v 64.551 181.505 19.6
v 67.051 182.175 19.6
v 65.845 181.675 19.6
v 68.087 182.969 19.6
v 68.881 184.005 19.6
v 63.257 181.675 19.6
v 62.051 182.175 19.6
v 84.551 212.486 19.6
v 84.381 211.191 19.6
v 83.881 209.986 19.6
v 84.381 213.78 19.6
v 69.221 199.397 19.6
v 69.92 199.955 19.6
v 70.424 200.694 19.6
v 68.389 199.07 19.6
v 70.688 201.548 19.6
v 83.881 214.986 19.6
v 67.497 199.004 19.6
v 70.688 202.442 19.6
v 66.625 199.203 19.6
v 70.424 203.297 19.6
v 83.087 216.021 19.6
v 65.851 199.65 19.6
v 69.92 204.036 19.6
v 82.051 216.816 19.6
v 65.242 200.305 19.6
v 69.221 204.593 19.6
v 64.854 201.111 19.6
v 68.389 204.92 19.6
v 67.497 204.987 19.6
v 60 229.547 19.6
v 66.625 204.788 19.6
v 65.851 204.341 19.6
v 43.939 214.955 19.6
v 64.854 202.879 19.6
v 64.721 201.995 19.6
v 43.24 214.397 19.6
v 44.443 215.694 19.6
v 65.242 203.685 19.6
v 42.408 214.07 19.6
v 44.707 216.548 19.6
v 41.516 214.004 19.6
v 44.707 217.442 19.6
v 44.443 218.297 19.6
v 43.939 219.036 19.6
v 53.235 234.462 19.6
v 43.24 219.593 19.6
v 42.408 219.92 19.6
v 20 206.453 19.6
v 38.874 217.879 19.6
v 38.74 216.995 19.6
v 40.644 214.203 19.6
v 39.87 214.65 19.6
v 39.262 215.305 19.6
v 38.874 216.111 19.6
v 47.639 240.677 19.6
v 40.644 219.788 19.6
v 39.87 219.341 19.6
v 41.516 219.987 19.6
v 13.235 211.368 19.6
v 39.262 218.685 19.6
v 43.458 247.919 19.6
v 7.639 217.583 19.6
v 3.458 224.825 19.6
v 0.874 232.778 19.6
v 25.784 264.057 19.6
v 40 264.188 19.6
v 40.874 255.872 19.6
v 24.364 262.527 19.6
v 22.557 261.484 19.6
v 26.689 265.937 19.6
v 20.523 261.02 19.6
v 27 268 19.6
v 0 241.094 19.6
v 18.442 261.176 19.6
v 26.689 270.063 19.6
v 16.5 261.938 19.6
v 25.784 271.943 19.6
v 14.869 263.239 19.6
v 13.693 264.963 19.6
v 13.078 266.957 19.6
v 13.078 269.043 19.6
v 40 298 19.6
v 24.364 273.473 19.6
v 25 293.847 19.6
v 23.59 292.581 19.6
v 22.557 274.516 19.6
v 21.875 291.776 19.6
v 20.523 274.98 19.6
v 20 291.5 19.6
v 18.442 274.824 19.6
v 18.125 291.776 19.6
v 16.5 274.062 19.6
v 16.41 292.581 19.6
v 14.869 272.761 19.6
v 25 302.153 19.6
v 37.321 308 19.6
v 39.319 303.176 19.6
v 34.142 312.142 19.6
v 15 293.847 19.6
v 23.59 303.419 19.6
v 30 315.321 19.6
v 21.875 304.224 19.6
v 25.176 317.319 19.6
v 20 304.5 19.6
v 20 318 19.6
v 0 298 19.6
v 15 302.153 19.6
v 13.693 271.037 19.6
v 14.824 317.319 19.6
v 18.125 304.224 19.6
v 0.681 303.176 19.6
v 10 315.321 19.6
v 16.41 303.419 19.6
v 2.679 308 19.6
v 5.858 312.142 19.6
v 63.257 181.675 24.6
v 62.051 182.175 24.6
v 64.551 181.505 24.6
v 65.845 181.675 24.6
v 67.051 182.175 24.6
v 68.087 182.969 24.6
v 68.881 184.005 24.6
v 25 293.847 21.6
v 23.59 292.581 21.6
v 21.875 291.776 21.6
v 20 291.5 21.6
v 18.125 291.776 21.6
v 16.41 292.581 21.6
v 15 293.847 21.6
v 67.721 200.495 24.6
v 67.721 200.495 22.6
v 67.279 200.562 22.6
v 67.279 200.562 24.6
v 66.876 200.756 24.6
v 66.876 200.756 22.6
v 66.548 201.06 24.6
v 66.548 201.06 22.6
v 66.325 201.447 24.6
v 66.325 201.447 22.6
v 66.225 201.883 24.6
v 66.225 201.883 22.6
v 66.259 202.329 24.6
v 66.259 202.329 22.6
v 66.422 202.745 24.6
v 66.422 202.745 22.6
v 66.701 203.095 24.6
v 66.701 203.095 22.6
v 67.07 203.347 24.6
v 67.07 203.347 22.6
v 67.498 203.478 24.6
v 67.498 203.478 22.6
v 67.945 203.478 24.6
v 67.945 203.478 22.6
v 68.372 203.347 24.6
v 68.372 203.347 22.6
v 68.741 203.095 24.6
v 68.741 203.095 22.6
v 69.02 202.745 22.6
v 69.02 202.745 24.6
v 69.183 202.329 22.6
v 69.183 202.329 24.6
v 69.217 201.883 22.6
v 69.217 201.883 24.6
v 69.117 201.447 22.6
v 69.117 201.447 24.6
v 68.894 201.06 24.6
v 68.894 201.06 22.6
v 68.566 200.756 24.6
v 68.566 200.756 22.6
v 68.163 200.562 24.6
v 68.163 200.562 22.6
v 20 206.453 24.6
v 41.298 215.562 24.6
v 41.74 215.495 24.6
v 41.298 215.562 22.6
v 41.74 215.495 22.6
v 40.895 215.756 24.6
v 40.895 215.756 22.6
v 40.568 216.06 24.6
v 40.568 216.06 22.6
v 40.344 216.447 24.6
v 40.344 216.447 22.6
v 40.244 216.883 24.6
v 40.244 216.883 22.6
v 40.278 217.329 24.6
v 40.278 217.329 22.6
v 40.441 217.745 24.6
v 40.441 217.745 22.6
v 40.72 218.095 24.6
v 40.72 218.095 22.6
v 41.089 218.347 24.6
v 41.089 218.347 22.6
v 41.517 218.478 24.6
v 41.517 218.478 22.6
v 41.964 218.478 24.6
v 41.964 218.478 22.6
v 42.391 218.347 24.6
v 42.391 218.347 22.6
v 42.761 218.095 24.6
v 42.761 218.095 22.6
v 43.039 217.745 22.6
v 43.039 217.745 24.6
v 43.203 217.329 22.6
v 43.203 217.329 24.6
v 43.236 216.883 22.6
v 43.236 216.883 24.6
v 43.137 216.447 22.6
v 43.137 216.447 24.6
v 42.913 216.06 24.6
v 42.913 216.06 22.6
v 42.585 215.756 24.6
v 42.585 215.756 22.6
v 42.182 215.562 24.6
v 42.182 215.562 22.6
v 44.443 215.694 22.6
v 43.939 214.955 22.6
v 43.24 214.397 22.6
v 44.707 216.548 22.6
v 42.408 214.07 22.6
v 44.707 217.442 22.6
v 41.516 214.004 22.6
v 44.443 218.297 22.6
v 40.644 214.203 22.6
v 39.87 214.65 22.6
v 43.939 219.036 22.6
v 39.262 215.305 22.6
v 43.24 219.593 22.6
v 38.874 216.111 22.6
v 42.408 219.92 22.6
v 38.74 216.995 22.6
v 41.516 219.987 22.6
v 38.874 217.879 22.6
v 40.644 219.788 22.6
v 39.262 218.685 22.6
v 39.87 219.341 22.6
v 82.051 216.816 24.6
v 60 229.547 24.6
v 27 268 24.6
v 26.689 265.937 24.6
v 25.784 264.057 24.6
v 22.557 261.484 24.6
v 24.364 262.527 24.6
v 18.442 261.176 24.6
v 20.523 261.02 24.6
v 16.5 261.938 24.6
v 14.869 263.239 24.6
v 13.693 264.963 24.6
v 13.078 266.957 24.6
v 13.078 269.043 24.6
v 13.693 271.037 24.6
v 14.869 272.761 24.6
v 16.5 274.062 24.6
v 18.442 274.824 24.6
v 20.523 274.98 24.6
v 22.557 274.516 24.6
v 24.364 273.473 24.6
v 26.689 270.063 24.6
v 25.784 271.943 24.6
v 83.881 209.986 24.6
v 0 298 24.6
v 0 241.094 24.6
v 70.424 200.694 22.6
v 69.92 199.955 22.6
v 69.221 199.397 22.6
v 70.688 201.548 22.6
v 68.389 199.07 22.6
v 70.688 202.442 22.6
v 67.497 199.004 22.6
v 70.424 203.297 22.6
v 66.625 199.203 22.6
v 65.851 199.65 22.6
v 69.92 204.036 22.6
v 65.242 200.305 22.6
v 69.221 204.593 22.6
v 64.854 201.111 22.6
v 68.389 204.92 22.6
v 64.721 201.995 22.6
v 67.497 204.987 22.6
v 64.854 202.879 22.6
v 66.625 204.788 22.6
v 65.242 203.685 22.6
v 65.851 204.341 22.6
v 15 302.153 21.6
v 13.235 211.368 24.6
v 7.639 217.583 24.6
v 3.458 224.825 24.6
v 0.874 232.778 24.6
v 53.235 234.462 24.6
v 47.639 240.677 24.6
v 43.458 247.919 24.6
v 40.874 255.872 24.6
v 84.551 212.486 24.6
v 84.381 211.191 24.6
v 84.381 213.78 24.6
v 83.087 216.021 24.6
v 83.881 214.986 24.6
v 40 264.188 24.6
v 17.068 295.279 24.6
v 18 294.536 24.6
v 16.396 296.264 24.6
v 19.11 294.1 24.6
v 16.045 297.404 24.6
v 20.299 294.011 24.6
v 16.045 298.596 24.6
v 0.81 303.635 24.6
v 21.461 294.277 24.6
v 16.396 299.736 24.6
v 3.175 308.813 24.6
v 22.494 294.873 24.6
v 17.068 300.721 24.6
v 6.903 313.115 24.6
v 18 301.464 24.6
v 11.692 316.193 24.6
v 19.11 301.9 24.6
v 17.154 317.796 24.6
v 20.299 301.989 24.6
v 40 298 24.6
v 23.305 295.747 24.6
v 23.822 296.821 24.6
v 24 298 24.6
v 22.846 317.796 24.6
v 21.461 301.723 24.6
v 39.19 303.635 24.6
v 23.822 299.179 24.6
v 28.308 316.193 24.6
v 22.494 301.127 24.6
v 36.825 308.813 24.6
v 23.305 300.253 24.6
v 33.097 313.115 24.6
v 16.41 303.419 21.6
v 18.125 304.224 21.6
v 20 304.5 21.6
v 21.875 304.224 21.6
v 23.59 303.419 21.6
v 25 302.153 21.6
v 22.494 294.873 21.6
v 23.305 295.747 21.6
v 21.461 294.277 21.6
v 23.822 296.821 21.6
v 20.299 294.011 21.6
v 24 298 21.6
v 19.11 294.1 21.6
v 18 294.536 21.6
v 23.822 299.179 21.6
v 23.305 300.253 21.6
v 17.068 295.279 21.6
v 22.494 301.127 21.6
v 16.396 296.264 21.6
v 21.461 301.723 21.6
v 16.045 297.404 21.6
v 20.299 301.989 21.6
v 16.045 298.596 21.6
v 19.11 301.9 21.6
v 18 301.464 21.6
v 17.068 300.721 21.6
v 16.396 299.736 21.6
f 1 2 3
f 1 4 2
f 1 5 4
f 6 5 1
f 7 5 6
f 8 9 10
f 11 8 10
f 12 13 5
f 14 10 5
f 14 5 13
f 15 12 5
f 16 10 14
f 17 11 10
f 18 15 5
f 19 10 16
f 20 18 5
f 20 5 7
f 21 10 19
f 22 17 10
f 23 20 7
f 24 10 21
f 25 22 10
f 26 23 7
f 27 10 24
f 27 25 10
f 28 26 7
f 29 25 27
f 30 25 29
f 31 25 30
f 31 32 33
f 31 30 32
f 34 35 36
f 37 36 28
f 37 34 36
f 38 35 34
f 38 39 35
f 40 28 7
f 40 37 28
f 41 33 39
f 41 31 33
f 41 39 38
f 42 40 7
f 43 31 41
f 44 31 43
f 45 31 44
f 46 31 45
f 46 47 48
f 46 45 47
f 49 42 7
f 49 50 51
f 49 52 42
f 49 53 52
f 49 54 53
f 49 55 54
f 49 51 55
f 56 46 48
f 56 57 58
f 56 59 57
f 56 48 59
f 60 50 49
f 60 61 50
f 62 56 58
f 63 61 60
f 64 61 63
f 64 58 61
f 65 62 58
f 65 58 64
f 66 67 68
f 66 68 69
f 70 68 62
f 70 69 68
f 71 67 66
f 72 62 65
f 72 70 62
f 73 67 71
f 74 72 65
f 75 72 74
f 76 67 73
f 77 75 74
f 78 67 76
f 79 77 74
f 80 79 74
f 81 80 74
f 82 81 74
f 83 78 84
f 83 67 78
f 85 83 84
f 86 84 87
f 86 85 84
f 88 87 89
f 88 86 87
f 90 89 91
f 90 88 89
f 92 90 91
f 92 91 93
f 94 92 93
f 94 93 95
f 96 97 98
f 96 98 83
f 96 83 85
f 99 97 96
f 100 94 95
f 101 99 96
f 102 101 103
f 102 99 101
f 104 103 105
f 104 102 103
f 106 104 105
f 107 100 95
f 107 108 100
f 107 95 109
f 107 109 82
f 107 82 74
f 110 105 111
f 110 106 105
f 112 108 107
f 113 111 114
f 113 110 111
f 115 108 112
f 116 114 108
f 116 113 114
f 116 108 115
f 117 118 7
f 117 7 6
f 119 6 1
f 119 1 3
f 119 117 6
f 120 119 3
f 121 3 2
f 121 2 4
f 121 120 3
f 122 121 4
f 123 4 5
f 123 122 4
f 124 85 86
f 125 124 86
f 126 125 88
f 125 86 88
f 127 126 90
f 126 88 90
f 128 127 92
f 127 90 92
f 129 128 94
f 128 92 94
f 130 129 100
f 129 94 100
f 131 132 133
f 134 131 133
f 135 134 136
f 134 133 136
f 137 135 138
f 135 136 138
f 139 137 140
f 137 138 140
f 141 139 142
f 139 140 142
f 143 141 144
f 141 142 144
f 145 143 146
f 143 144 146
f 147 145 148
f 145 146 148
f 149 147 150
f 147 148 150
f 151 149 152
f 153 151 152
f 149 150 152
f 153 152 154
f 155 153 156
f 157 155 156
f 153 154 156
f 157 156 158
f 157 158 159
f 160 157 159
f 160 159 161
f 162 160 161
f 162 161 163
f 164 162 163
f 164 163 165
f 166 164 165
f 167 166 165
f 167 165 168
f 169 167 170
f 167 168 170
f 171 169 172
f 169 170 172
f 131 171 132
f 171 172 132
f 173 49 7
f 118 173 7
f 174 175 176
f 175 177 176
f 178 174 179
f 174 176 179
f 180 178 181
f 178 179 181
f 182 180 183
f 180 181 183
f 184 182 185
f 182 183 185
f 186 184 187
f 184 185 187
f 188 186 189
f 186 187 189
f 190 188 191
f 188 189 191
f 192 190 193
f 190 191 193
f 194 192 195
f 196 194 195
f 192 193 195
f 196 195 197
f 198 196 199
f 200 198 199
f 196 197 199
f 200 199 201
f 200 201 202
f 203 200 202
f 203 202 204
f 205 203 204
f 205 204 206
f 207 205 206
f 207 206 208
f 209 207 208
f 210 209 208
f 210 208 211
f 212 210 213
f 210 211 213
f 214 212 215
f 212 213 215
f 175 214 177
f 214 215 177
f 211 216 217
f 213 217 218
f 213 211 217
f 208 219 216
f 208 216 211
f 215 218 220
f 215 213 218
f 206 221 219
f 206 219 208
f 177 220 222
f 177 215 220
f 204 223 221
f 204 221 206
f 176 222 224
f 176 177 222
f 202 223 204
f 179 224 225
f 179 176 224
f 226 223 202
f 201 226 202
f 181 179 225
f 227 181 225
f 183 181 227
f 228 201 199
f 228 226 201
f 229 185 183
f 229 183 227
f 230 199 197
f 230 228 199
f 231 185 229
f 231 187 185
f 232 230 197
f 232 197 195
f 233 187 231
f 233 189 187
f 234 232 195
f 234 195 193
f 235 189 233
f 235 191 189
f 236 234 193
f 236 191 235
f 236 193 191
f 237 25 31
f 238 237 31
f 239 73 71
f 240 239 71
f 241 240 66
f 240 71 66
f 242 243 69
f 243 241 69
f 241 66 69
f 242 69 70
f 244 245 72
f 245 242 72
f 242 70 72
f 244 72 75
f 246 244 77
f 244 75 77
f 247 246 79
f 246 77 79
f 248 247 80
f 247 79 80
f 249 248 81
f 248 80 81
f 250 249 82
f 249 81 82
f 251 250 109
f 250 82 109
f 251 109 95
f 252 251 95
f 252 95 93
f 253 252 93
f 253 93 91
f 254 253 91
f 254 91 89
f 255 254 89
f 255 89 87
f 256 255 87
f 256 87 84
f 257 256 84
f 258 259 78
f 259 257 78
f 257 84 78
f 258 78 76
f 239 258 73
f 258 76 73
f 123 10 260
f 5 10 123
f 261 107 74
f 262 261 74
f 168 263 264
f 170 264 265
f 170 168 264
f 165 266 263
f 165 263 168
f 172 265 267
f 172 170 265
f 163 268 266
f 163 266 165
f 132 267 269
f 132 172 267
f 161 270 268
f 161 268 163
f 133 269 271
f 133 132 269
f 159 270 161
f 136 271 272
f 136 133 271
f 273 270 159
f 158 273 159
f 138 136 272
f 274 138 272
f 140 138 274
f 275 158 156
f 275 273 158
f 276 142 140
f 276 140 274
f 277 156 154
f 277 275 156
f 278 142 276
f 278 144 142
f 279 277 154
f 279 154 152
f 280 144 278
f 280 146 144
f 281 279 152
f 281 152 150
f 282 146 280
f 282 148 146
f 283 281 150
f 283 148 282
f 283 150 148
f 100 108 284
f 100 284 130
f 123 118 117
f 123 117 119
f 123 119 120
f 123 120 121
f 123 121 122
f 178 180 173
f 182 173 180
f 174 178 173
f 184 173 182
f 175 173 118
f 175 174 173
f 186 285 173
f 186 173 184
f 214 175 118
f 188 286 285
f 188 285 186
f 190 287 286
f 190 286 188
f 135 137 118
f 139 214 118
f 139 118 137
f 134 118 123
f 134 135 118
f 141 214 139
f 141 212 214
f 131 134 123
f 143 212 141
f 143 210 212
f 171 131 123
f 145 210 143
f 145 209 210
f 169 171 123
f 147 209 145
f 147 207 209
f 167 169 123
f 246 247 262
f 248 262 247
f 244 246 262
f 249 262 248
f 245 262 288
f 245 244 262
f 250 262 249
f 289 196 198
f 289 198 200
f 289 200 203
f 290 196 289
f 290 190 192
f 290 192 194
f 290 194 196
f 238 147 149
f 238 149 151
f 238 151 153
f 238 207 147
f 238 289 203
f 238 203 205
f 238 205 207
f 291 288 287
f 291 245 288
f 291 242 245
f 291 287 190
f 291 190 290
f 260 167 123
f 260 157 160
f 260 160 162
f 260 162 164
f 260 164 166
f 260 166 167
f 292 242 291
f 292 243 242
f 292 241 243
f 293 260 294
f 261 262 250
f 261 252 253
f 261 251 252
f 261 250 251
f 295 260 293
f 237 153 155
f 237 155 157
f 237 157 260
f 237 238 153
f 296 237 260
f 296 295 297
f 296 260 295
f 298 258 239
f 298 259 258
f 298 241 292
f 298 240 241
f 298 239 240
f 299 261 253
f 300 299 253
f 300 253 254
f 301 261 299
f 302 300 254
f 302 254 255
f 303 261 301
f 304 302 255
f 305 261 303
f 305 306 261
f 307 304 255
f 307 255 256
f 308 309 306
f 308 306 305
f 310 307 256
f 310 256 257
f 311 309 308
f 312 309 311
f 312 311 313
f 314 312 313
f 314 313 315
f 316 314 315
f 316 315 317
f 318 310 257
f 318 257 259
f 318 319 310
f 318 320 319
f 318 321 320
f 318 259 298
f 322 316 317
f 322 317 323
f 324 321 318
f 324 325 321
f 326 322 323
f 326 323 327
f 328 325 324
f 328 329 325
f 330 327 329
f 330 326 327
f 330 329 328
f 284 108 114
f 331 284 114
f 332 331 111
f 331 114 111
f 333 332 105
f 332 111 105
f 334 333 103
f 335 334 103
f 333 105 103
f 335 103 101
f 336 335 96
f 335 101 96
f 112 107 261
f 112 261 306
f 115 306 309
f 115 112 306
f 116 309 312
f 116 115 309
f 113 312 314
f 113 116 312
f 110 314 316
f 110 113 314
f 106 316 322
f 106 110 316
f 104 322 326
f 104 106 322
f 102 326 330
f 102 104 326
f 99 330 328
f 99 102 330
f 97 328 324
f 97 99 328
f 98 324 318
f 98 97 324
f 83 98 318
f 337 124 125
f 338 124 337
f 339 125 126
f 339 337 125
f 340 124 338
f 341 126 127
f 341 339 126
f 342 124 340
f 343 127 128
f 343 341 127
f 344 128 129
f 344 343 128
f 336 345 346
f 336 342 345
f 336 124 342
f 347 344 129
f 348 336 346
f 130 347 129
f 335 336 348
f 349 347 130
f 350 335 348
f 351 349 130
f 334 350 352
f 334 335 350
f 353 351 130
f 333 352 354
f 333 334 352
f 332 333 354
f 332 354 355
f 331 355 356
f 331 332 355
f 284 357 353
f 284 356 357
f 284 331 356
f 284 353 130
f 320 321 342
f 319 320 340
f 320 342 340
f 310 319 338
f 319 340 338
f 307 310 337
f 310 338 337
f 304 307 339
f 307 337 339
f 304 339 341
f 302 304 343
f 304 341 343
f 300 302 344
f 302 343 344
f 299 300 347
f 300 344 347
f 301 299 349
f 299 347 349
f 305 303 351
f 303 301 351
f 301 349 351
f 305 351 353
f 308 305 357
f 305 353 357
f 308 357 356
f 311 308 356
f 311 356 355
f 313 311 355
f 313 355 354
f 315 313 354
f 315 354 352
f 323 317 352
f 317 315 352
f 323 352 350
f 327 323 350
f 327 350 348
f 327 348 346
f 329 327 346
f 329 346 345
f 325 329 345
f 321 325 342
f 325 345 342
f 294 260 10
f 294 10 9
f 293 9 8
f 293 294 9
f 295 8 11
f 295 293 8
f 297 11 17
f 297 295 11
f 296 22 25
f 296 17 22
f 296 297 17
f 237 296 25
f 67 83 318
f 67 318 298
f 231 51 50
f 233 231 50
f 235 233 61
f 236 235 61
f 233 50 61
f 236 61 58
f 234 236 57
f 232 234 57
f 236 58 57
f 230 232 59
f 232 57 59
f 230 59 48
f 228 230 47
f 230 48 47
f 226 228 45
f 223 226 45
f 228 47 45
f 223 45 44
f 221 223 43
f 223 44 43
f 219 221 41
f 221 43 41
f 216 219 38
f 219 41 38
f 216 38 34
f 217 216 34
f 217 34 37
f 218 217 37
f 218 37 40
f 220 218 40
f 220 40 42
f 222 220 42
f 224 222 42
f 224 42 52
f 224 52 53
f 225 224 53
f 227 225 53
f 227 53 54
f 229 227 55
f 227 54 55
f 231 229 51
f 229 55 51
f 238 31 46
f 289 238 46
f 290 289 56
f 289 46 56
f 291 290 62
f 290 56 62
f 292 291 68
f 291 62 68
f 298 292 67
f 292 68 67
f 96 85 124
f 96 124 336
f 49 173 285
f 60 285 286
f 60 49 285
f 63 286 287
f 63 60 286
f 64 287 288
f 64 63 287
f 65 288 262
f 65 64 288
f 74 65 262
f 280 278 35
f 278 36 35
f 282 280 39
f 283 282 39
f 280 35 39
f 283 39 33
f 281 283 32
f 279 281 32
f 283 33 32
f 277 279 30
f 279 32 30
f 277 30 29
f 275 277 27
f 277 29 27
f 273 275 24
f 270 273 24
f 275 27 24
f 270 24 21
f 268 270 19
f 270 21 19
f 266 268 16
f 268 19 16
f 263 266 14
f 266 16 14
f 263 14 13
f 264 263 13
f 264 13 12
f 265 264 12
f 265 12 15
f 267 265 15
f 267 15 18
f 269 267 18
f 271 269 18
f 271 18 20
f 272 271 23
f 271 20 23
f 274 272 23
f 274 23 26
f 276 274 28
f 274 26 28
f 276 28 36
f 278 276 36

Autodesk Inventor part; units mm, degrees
ref_plane "YZ Plane" through (0, 0, 0) normal (1, 0, 0) x (0, 1, 0)
ref_plane "XZ Plane" through (0, 0, 0) normal (0, 1, 0) x (-1, 0, 0)
ref_plane "XY Plane" through (0, 0, 0) normal (0, 0, 1) x (1, 0, 0)
sketch "スケッチ1" plane through (0, 0, 0) normal (0, 0, 1) x (1, 0, 0)
  line L0 (0, 0) -> (40, 0)
  line L1 (40, 0) -> (40, 318)
  line L2 (40, 318) -> (0, 318)
  line L3 (0, 318) -> (0, 0)
  line L4 (0, 218) -> (112.7627, 152.8964)
  line L5 (112.7627, 152.8964) -> (132.7627, 187.5375)
  line L6 (132.7627, 187.5375) -> (40, 241.094)
  point P0 (40, 218)
  point P1 (40, 194.906)
  point P2 (20, 318)
  point P3 (122.7627, 170.2169)
  point P4 (20, 258)
  dimension "d0" = 40
  dimension "d1" = 318
  dimension "d69" = 40
  dimension "d70" = 60
  dimension "d91" = 20
  dimension "d92" = 100
  dimension "d93" = 180
  dimension "d96" = 20
  dimension "d97" = 60
extrude "押し出し1" add sketch "スケッチ1" along normal blind 19.6 contours L3 L2 L1 L4 | L1 L6 L5 L4
sketch "スケッチ6" plane through (0, 0, 19.6) normal (0, 0, 1) x (1, 0, 0)
  circle A0 centre (20, 268) radius 7
  line L0 (40, 318) -> (0, 318) projected
  line L1 (40, 241.094) -> (40, 318) projected
  circle A1 centre (20, 20) radius 1.2295
  circle A2 centre (20, 10) radius 1.2295
  line L2 (0, 0) -> (40, 0) projected
  circle A3 centre (20, 298) radius 4
  point P0 (20, 318)
  point P1 (40, 190.8114)
  point P2 (30, 0)
  dimension "d42" = 14
  dimension "d44" = 20
  dimension "d45" = 2.459
  dimension "d46" = 2.459
  dimension "d47" = 10
  dimension "d48" = 10
  dimension "d49" = 20
  dimension "d50" = 20
  dimension "d53" = 8
  dimension "d54" = 20
  dimension "d55" = 30
  dimension "d56" = 20
extrude "押し出し4" cut sketch "スケッチ6" against normal through all contours A0 | A3
sketch "スケッチ8" plane through (0, 0, 0) normal (-1, 0, 0) x (0, 0, 1)
  line L0 (0, 318) -> (19.6, 318) projected
  line L1 (5, 318) -> (14.6, 318)
  line L2 (14.6, 318) -> (14.6, 278)
  line L3 (14.6, 278) -> (5, 278)
  line L4 (5, 278) -> (5, 318)
  line L5 (0, 318) -> (0, 0) projected
  dimension "d57" = 5
  dimension "d58" = 9.6
  dimension "d59" = 40
  dimension "d98" = 19.6
extrude "押し出し5" cut sketch "スケッチ8" against normal through all
fillet "フィレット1" radius 20 4 edges at (40, 318, 17.1) (40, 318, 2.5) (0, 318, 2.5) (0, 318, 17.1)
fillet "フィレット2" radius 40 2 edges at (0, 218, 9.8) (40, 241.094, 9.8)
sketch "スケッチ9" plane through (0, 0, 19.6) normal (0, 0, 1) x (1, 0, 0)
  line L0 (20, 206.453) -> (112.7627, 152.8964) projected
  line L1 (132.7627, 187.5375) -> (60, 229.547) projected
  line L2 (112.7627, 152.8964) -> (132.7627, 187.5375) projected
  line L3 (132.7627, 187.5375) -> (112.7627, 152.8964)
  line L4 (66.3813, 179.6747) -> (112.7627, 152.8964)
  line L5 (132.7627, 187.5375) -> (166.773, 167.9016)
  line L6 (115.1204, 126.9801) -> (133.5174, 158.8446)
  line L7 (141.7531, 173.1092) -> (128.7627, 180.6092)
  line L8 (112.7627, 152.8964) -> (20, 206.453)
  line L9 (132.7627, 187.5375) -> (60, 229.547)
  line L10 (115.1204, 126.9801) -> (125.7531, 145.3964)
  line L11 (133.5174, 158.8446) -> (145.7531, 180.0375)
  line L12 (116.7627, 159.8246) -> (129.7531, 152.3246)
  line L13 (66.3813, 179.6747) -> (129.7531, 152.3246)
  line L14 (66.3813, 179.6747) -> (86.3813, 214.3157)
  line L15 (86.3813, 214.3157) -> (141.7531, 173.1092)
  point P0 (0, 0)
  point P1 (254.4532, 80.329)
  point P2 (128.7627, 180.6092)
  point P3 (123.2579, 156.0746)
  point P4 (86.3813, 214.3157)
  point P5 (40, 194.906)
  point P6 (115.8875, 158.3088)
  point P7 (129.6379, 182.1251)
  dimension "d80" = 24
  dimension "d81" = 40
  dimension "d83" = 15
  dimension "d84" = 8
  dimension "d90" = 24
extrude "押し出し6" cut sketch "スケッチ9" against normal through all contours L13 L2 L0 | L1 L2 L15
sketch "スケッチ11" plane through (104.9897, 139.4332, 24) normal (0.8660254, -0.5, 0) x (0, 0, -1)
  line L0 (4.4, 21.7957) -> (4.4, 49.2964) projected
  line L1 (24, 21.7957) -> (24, 49.2964) projected
  line L2 (0, 24) -> (24, 24)
  line L3 (24, 24) -> (24, 0)
  line L4 (24, 0) -> (0, 0)
  line L5 (0, 0) -> (0, 24)
  line L6 (17, 17) -> (7, 17)
  line L7 (7, 17) -> (7, 7)
  line L8 (7, 7) -> (17, 7)
  line L9 (17, 7) -> (17, 17)
  line L10 (4.4, 35.546) -> (24, 35.546) projected
  circle A0 centre (14.2, 35.546) radius 5
  point P0 (24, -173.2475)
  point P1 (24, 24)
  point P2 (0, 15.546)
  point P3 (24, 15.546)
  dimension "d85" = 10
  dimension "d88" = 10
extrude "押し出し7" add sketch "スケッチ11" along normal blind 15 contours A0 L10 | L10 A0
fillet "フィレット4" radius 20 2 edges at (0, 278, 9.8) (40, 278, 9.8)
sketch "スケッチ12" plane through (0, 0, 19.6) normal (0, 0, 1) x (1, 0, 0)
  line L0 (0, 340.2847) -> (40, 340.2847)
  line L1 (40, 340.2847) -> (40, 181.2581)
  line L2 (40, 181.2581) -> (0, 181.2581)
  line L3 (0, 181.2581) -> (0, 340.2847)
  line L4 (40, 264.188) -> (40, 298) projected
  arc A0 (40, 298) -> (0, 298) centre (20, 298) ccw
  arc A1 (40, 264.188) -> (60, 229.547) centre (80, 264.188) ccw projected
  line L5 (60, 229.547) -> (40, 194.906)
  line L6 (20, 206.453) -> (66.3813, 179.6747) projected
  arc A2 (0, 241.094) -> (20, 206.453) centre (40, 241.094) ccw projected
  arc A3 (0, 241.094) -> (20, 206.453) centre (40, 241.094) ccw
  line L7 (20, 206.453) -> (40, 194.906)
  line L8 (86.3813, 214.3157) -> (60, 229.547) projected
  line L9 (60, 229.547) -> (86.3813, 214.3157)
  line L10 (86.3813, 214.3157) -> (66.3813, 179.6747)
  line L11 (40, 194.906) -> (66.3813, 179.6747)
  circle A4 centre (20, 298) radius 4
  circle A5 centre (20, 268) radius 7 projected
  circle A6 centre (20, 268) radius 4
  point P0 (0, 0)
  dimension "d99" = 40
  dimension "d100" = 40
extrude "押し出し8" add sketch "スケッチ12" along normal blind 5 contours A0 L1 L6 A2 L3 | A1 L5 L1 | L5 L8 L10 L6
sketch "スケッチ13" plane through (0, 0, 0) normal (0, 0, -1) x (-1, 0, 0)
  line L0 (-253.843, 397.4333) -> (123.9074, 397.4333)
  line L1 (123.9074, 397.4333) -> (123.9074, 95.9261)
  line L2 (123.9074, 95.9261) -> (-253.843, 95.9261)
  line L3 (-253.843, 95.9261) -> (-253.843, 397.4333)
  point P0 (0, 0)
extrude "押し出し9" cut sketch "スケッチ13" against normal blind 19.6
sketch "スケッチ14" plane through (0, 0, 24.6) normal (0, 0, 1) x (1, 0, 0)
  line L0 (20, 206.453) -> (66.3813, 179.6747) projected
  line L1 (66.3813, 179.6747) -> (86.3813, 214.3157) projected
  line L2 (41.7403, 216.9952) -> (76.3813, 196.9952)
  point P0 (0, 0)
  point P1 (67.7211, 201.9952)
  dimension "d105" = 20
  dimension "d106" = 20
  dimension "d107" = 30
  dimension "d108" = 10
hole "穴3" at (41.7403, 216.9952, 24.6) at (67.7211, 201.9952, 24.6) direction (0, 0, -1) diameter 3 end through all
fillet "フィレット5" radius 5 2 edges at (86.3813, 214.3157, 22.1) (66.3813, 179.6747, 22.1)
sketch "スケッチ16" plane through (0, 0, 19.6) normal (0, 0, -1) x (-1, 0, 0)
  circle A0 centre (-67.7211, 201.9952) radius 1.5 projected
  circle A1 centre (-67.7211, 201.9952) radius 3
  circle A2 centre (-41.7403, 216.9952) radius 1.5 projected
  circle A3 centre (-41.7403, 216.9952) radius 3
  point P0 (0, 0)
  dimension "d121" = 6
  dimension "d122" = 6
extrude "押し出し11" cut sketch "スケッチ16" against normal blind 3 contours A0 | A1 | A2 | A3
sketch "スケッチ17" plane through (0, 0, 19.6) normal (0, 0, -1) x (-1, 0, 0)
  circle A0 centre (-20, 298) radius 4 projected
  circle A1 centre (-20, 298) radius 6.5
  line L0 (-25, 306.9818) -> (-15, 306.9818)
  line L1 (-15, 306.9818) -> (-15, 289.1648)
  line L2 (-15, 289.1648) -> (-25, 289.1648)
  line L3 (-25, 289.1648) -> (-25, 306.9818)
  point P0 (0, 0)
  point P1 (-25, 302.1533)
  point P2 (-25, 293.8467)
  point P3 (-15, 293.8467)
  point P4 (-15, 302.1533)
  dimension "d125" = 13
  dimension "d126" = 5
  dimension "d127" = 10
extrude "押し出し12" cut sketch "スケッチ17" against normal blind 2 contours L1 A1 L3
equation "\"d45\" = d46"
equation "\"d48\" = d47"
equation "\"d50\" = d49"
equation "\"d106\" = d105"
properties part number "BR_parts_06(3)" material "アルミニウム 6061"
